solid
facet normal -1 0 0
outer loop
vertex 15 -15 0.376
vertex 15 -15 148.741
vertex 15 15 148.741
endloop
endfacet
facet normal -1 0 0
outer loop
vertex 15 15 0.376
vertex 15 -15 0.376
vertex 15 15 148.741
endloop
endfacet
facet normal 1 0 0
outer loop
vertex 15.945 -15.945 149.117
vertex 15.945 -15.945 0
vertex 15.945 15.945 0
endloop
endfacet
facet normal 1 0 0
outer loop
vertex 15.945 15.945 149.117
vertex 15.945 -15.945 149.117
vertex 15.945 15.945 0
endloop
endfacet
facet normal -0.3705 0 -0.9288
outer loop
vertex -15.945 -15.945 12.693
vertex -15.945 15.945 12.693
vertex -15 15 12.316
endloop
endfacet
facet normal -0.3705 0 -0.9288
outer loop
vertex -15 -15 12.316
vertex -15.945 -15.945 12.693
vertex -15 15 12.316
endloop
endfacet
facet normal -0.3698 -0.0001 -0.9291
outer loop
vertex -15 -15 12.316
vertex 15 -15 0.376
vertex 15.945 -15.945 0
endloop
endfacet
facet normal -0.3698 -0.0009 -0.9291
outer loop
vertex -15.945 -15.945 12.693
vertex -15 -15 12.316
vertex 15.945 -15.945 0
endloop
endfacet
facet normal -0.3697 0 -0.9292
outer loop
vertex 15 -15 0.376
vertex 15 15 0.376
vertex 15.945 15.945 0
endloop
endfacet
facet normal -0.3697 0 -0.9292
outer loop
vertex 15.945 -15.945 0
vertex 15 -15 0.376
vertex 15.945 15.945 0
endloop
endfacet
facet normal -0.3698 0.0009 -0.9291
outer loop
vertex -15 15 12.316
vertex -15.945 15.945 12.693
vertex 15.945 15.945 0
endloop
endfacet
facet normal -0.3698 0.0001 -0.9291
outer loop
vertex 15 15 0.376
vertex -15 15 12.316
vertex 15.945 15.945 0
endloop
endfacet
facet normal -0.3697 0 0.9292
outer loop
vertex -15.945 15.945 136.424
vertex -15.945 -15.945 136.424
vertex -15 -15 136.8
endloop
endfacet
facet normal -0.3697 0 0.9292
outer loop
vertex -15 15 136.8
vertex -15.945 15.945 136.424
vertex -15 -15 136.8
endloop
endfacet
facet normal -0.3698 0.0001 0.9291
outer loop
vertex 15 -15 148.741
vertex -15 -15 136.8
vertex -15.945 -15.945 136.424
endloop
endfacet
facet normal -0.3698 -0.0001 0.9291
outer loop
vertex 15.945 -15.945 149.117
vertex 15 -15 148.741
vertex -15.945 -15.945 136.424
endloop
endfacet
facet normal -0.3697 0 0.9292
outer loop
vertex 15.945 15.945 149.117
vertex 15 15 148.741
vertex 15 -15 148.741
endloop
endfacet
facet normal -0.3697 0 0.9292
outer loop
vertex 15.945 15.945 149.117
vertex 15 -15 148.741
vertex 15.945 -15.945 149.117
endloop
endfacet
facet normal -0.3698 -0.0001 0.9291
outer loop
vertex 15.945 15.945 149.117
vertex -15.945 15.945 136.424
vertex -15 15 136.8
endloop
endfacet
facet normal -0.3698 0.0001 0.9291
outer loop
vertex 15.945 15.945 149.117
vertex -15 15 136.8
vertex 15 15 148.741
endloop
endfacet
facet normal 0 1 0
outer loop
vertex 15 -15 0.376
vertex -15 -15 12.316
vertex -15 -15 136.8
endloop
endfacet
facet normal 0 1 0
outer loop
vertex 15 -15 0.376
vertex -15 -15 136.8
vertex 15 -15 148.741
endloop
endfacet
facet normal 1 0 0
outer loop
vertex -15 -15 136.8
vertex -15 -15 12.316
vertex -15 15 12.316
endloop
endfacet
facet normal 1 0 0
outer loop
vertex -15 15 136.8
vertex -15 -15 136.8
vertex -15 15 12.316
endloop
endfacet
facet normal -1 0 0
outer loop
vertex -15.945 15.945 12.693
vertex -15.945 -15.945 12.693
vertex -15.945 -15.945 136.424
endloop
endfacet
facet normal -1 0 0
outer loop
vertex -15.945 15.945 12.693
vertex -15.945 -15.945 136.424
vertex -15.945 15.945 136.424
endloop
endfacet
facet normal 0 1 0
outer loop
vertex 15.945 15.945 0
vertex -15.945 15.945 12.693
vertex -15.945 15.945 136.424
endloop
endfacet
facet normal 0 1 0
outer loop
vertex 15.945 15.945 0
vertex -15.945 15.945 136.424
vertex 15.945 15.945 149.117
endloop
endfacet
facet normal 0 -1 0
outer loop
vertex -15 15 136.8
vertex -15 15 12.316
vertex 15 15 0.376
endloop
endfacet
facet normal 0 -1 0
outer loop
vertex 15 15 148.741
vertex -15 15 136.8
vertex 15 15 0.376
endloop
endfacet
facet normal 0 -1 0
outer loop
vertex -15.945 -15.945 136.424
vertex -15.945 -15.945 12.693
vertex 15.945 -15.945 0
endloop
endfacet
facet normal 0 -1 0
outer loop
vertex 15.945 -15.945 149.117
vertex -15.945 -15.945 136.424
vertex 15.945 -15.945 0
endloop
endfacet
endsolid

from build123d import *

# Parameters (mm, degrees)
ESBO_O1_W                = 31.890446896
ESBO_O1_H                = 31.890446896
ESBO_O1_W_2              = 30
ESBO_O1_H_2              = 30
RESSALTO_EXTRUS_O1_DEPTH = 149.11688245
CORTE_EXTRUS_O1_DEPTH    = 154.320238017


with BuildPart() as part:
    # Esboço1 → Ressalto-extrusão1 (new body)
    with BuildSketch(Plane.XY):
        Rectangle(ESBO_O1_W, ESBO_O1_H)
        Rectangle(ESBO_O1_W_2, ESBO_O1_H_2, mode=Mode.SUBTRACT)
    extrude(amount=RESSALTO_EXTRUS_O1_DEPTH)

    # Esboço3 → Corte-extrusão1 (cut, symmetric)
    with BuildSketch(Plane(origin=(0, 15.945223448, 0), x_dir=(1, 0, 0), z_dir=(0, 1, 0))):
        Polygon((-15.945223448, -12.692594834), (15.945223448, 0), (-15.945223448, 0), align=None)
    corte_extrus_o1 = extrude(amount=CORTE_EXTRUS_O1_DEPTH, both=True, mode=Mode.SUBTRACT)

    # Espelhar5: Corte-extrusão1 across plane
    add(corte_extrus_o1.mirror(Plane(origin=(0, 0, 74.558441225), x_dir=(1, 0, 0), z_dir=(0, 0, -1))), mode=Mode.SUBTRACT)


solid = part.part
